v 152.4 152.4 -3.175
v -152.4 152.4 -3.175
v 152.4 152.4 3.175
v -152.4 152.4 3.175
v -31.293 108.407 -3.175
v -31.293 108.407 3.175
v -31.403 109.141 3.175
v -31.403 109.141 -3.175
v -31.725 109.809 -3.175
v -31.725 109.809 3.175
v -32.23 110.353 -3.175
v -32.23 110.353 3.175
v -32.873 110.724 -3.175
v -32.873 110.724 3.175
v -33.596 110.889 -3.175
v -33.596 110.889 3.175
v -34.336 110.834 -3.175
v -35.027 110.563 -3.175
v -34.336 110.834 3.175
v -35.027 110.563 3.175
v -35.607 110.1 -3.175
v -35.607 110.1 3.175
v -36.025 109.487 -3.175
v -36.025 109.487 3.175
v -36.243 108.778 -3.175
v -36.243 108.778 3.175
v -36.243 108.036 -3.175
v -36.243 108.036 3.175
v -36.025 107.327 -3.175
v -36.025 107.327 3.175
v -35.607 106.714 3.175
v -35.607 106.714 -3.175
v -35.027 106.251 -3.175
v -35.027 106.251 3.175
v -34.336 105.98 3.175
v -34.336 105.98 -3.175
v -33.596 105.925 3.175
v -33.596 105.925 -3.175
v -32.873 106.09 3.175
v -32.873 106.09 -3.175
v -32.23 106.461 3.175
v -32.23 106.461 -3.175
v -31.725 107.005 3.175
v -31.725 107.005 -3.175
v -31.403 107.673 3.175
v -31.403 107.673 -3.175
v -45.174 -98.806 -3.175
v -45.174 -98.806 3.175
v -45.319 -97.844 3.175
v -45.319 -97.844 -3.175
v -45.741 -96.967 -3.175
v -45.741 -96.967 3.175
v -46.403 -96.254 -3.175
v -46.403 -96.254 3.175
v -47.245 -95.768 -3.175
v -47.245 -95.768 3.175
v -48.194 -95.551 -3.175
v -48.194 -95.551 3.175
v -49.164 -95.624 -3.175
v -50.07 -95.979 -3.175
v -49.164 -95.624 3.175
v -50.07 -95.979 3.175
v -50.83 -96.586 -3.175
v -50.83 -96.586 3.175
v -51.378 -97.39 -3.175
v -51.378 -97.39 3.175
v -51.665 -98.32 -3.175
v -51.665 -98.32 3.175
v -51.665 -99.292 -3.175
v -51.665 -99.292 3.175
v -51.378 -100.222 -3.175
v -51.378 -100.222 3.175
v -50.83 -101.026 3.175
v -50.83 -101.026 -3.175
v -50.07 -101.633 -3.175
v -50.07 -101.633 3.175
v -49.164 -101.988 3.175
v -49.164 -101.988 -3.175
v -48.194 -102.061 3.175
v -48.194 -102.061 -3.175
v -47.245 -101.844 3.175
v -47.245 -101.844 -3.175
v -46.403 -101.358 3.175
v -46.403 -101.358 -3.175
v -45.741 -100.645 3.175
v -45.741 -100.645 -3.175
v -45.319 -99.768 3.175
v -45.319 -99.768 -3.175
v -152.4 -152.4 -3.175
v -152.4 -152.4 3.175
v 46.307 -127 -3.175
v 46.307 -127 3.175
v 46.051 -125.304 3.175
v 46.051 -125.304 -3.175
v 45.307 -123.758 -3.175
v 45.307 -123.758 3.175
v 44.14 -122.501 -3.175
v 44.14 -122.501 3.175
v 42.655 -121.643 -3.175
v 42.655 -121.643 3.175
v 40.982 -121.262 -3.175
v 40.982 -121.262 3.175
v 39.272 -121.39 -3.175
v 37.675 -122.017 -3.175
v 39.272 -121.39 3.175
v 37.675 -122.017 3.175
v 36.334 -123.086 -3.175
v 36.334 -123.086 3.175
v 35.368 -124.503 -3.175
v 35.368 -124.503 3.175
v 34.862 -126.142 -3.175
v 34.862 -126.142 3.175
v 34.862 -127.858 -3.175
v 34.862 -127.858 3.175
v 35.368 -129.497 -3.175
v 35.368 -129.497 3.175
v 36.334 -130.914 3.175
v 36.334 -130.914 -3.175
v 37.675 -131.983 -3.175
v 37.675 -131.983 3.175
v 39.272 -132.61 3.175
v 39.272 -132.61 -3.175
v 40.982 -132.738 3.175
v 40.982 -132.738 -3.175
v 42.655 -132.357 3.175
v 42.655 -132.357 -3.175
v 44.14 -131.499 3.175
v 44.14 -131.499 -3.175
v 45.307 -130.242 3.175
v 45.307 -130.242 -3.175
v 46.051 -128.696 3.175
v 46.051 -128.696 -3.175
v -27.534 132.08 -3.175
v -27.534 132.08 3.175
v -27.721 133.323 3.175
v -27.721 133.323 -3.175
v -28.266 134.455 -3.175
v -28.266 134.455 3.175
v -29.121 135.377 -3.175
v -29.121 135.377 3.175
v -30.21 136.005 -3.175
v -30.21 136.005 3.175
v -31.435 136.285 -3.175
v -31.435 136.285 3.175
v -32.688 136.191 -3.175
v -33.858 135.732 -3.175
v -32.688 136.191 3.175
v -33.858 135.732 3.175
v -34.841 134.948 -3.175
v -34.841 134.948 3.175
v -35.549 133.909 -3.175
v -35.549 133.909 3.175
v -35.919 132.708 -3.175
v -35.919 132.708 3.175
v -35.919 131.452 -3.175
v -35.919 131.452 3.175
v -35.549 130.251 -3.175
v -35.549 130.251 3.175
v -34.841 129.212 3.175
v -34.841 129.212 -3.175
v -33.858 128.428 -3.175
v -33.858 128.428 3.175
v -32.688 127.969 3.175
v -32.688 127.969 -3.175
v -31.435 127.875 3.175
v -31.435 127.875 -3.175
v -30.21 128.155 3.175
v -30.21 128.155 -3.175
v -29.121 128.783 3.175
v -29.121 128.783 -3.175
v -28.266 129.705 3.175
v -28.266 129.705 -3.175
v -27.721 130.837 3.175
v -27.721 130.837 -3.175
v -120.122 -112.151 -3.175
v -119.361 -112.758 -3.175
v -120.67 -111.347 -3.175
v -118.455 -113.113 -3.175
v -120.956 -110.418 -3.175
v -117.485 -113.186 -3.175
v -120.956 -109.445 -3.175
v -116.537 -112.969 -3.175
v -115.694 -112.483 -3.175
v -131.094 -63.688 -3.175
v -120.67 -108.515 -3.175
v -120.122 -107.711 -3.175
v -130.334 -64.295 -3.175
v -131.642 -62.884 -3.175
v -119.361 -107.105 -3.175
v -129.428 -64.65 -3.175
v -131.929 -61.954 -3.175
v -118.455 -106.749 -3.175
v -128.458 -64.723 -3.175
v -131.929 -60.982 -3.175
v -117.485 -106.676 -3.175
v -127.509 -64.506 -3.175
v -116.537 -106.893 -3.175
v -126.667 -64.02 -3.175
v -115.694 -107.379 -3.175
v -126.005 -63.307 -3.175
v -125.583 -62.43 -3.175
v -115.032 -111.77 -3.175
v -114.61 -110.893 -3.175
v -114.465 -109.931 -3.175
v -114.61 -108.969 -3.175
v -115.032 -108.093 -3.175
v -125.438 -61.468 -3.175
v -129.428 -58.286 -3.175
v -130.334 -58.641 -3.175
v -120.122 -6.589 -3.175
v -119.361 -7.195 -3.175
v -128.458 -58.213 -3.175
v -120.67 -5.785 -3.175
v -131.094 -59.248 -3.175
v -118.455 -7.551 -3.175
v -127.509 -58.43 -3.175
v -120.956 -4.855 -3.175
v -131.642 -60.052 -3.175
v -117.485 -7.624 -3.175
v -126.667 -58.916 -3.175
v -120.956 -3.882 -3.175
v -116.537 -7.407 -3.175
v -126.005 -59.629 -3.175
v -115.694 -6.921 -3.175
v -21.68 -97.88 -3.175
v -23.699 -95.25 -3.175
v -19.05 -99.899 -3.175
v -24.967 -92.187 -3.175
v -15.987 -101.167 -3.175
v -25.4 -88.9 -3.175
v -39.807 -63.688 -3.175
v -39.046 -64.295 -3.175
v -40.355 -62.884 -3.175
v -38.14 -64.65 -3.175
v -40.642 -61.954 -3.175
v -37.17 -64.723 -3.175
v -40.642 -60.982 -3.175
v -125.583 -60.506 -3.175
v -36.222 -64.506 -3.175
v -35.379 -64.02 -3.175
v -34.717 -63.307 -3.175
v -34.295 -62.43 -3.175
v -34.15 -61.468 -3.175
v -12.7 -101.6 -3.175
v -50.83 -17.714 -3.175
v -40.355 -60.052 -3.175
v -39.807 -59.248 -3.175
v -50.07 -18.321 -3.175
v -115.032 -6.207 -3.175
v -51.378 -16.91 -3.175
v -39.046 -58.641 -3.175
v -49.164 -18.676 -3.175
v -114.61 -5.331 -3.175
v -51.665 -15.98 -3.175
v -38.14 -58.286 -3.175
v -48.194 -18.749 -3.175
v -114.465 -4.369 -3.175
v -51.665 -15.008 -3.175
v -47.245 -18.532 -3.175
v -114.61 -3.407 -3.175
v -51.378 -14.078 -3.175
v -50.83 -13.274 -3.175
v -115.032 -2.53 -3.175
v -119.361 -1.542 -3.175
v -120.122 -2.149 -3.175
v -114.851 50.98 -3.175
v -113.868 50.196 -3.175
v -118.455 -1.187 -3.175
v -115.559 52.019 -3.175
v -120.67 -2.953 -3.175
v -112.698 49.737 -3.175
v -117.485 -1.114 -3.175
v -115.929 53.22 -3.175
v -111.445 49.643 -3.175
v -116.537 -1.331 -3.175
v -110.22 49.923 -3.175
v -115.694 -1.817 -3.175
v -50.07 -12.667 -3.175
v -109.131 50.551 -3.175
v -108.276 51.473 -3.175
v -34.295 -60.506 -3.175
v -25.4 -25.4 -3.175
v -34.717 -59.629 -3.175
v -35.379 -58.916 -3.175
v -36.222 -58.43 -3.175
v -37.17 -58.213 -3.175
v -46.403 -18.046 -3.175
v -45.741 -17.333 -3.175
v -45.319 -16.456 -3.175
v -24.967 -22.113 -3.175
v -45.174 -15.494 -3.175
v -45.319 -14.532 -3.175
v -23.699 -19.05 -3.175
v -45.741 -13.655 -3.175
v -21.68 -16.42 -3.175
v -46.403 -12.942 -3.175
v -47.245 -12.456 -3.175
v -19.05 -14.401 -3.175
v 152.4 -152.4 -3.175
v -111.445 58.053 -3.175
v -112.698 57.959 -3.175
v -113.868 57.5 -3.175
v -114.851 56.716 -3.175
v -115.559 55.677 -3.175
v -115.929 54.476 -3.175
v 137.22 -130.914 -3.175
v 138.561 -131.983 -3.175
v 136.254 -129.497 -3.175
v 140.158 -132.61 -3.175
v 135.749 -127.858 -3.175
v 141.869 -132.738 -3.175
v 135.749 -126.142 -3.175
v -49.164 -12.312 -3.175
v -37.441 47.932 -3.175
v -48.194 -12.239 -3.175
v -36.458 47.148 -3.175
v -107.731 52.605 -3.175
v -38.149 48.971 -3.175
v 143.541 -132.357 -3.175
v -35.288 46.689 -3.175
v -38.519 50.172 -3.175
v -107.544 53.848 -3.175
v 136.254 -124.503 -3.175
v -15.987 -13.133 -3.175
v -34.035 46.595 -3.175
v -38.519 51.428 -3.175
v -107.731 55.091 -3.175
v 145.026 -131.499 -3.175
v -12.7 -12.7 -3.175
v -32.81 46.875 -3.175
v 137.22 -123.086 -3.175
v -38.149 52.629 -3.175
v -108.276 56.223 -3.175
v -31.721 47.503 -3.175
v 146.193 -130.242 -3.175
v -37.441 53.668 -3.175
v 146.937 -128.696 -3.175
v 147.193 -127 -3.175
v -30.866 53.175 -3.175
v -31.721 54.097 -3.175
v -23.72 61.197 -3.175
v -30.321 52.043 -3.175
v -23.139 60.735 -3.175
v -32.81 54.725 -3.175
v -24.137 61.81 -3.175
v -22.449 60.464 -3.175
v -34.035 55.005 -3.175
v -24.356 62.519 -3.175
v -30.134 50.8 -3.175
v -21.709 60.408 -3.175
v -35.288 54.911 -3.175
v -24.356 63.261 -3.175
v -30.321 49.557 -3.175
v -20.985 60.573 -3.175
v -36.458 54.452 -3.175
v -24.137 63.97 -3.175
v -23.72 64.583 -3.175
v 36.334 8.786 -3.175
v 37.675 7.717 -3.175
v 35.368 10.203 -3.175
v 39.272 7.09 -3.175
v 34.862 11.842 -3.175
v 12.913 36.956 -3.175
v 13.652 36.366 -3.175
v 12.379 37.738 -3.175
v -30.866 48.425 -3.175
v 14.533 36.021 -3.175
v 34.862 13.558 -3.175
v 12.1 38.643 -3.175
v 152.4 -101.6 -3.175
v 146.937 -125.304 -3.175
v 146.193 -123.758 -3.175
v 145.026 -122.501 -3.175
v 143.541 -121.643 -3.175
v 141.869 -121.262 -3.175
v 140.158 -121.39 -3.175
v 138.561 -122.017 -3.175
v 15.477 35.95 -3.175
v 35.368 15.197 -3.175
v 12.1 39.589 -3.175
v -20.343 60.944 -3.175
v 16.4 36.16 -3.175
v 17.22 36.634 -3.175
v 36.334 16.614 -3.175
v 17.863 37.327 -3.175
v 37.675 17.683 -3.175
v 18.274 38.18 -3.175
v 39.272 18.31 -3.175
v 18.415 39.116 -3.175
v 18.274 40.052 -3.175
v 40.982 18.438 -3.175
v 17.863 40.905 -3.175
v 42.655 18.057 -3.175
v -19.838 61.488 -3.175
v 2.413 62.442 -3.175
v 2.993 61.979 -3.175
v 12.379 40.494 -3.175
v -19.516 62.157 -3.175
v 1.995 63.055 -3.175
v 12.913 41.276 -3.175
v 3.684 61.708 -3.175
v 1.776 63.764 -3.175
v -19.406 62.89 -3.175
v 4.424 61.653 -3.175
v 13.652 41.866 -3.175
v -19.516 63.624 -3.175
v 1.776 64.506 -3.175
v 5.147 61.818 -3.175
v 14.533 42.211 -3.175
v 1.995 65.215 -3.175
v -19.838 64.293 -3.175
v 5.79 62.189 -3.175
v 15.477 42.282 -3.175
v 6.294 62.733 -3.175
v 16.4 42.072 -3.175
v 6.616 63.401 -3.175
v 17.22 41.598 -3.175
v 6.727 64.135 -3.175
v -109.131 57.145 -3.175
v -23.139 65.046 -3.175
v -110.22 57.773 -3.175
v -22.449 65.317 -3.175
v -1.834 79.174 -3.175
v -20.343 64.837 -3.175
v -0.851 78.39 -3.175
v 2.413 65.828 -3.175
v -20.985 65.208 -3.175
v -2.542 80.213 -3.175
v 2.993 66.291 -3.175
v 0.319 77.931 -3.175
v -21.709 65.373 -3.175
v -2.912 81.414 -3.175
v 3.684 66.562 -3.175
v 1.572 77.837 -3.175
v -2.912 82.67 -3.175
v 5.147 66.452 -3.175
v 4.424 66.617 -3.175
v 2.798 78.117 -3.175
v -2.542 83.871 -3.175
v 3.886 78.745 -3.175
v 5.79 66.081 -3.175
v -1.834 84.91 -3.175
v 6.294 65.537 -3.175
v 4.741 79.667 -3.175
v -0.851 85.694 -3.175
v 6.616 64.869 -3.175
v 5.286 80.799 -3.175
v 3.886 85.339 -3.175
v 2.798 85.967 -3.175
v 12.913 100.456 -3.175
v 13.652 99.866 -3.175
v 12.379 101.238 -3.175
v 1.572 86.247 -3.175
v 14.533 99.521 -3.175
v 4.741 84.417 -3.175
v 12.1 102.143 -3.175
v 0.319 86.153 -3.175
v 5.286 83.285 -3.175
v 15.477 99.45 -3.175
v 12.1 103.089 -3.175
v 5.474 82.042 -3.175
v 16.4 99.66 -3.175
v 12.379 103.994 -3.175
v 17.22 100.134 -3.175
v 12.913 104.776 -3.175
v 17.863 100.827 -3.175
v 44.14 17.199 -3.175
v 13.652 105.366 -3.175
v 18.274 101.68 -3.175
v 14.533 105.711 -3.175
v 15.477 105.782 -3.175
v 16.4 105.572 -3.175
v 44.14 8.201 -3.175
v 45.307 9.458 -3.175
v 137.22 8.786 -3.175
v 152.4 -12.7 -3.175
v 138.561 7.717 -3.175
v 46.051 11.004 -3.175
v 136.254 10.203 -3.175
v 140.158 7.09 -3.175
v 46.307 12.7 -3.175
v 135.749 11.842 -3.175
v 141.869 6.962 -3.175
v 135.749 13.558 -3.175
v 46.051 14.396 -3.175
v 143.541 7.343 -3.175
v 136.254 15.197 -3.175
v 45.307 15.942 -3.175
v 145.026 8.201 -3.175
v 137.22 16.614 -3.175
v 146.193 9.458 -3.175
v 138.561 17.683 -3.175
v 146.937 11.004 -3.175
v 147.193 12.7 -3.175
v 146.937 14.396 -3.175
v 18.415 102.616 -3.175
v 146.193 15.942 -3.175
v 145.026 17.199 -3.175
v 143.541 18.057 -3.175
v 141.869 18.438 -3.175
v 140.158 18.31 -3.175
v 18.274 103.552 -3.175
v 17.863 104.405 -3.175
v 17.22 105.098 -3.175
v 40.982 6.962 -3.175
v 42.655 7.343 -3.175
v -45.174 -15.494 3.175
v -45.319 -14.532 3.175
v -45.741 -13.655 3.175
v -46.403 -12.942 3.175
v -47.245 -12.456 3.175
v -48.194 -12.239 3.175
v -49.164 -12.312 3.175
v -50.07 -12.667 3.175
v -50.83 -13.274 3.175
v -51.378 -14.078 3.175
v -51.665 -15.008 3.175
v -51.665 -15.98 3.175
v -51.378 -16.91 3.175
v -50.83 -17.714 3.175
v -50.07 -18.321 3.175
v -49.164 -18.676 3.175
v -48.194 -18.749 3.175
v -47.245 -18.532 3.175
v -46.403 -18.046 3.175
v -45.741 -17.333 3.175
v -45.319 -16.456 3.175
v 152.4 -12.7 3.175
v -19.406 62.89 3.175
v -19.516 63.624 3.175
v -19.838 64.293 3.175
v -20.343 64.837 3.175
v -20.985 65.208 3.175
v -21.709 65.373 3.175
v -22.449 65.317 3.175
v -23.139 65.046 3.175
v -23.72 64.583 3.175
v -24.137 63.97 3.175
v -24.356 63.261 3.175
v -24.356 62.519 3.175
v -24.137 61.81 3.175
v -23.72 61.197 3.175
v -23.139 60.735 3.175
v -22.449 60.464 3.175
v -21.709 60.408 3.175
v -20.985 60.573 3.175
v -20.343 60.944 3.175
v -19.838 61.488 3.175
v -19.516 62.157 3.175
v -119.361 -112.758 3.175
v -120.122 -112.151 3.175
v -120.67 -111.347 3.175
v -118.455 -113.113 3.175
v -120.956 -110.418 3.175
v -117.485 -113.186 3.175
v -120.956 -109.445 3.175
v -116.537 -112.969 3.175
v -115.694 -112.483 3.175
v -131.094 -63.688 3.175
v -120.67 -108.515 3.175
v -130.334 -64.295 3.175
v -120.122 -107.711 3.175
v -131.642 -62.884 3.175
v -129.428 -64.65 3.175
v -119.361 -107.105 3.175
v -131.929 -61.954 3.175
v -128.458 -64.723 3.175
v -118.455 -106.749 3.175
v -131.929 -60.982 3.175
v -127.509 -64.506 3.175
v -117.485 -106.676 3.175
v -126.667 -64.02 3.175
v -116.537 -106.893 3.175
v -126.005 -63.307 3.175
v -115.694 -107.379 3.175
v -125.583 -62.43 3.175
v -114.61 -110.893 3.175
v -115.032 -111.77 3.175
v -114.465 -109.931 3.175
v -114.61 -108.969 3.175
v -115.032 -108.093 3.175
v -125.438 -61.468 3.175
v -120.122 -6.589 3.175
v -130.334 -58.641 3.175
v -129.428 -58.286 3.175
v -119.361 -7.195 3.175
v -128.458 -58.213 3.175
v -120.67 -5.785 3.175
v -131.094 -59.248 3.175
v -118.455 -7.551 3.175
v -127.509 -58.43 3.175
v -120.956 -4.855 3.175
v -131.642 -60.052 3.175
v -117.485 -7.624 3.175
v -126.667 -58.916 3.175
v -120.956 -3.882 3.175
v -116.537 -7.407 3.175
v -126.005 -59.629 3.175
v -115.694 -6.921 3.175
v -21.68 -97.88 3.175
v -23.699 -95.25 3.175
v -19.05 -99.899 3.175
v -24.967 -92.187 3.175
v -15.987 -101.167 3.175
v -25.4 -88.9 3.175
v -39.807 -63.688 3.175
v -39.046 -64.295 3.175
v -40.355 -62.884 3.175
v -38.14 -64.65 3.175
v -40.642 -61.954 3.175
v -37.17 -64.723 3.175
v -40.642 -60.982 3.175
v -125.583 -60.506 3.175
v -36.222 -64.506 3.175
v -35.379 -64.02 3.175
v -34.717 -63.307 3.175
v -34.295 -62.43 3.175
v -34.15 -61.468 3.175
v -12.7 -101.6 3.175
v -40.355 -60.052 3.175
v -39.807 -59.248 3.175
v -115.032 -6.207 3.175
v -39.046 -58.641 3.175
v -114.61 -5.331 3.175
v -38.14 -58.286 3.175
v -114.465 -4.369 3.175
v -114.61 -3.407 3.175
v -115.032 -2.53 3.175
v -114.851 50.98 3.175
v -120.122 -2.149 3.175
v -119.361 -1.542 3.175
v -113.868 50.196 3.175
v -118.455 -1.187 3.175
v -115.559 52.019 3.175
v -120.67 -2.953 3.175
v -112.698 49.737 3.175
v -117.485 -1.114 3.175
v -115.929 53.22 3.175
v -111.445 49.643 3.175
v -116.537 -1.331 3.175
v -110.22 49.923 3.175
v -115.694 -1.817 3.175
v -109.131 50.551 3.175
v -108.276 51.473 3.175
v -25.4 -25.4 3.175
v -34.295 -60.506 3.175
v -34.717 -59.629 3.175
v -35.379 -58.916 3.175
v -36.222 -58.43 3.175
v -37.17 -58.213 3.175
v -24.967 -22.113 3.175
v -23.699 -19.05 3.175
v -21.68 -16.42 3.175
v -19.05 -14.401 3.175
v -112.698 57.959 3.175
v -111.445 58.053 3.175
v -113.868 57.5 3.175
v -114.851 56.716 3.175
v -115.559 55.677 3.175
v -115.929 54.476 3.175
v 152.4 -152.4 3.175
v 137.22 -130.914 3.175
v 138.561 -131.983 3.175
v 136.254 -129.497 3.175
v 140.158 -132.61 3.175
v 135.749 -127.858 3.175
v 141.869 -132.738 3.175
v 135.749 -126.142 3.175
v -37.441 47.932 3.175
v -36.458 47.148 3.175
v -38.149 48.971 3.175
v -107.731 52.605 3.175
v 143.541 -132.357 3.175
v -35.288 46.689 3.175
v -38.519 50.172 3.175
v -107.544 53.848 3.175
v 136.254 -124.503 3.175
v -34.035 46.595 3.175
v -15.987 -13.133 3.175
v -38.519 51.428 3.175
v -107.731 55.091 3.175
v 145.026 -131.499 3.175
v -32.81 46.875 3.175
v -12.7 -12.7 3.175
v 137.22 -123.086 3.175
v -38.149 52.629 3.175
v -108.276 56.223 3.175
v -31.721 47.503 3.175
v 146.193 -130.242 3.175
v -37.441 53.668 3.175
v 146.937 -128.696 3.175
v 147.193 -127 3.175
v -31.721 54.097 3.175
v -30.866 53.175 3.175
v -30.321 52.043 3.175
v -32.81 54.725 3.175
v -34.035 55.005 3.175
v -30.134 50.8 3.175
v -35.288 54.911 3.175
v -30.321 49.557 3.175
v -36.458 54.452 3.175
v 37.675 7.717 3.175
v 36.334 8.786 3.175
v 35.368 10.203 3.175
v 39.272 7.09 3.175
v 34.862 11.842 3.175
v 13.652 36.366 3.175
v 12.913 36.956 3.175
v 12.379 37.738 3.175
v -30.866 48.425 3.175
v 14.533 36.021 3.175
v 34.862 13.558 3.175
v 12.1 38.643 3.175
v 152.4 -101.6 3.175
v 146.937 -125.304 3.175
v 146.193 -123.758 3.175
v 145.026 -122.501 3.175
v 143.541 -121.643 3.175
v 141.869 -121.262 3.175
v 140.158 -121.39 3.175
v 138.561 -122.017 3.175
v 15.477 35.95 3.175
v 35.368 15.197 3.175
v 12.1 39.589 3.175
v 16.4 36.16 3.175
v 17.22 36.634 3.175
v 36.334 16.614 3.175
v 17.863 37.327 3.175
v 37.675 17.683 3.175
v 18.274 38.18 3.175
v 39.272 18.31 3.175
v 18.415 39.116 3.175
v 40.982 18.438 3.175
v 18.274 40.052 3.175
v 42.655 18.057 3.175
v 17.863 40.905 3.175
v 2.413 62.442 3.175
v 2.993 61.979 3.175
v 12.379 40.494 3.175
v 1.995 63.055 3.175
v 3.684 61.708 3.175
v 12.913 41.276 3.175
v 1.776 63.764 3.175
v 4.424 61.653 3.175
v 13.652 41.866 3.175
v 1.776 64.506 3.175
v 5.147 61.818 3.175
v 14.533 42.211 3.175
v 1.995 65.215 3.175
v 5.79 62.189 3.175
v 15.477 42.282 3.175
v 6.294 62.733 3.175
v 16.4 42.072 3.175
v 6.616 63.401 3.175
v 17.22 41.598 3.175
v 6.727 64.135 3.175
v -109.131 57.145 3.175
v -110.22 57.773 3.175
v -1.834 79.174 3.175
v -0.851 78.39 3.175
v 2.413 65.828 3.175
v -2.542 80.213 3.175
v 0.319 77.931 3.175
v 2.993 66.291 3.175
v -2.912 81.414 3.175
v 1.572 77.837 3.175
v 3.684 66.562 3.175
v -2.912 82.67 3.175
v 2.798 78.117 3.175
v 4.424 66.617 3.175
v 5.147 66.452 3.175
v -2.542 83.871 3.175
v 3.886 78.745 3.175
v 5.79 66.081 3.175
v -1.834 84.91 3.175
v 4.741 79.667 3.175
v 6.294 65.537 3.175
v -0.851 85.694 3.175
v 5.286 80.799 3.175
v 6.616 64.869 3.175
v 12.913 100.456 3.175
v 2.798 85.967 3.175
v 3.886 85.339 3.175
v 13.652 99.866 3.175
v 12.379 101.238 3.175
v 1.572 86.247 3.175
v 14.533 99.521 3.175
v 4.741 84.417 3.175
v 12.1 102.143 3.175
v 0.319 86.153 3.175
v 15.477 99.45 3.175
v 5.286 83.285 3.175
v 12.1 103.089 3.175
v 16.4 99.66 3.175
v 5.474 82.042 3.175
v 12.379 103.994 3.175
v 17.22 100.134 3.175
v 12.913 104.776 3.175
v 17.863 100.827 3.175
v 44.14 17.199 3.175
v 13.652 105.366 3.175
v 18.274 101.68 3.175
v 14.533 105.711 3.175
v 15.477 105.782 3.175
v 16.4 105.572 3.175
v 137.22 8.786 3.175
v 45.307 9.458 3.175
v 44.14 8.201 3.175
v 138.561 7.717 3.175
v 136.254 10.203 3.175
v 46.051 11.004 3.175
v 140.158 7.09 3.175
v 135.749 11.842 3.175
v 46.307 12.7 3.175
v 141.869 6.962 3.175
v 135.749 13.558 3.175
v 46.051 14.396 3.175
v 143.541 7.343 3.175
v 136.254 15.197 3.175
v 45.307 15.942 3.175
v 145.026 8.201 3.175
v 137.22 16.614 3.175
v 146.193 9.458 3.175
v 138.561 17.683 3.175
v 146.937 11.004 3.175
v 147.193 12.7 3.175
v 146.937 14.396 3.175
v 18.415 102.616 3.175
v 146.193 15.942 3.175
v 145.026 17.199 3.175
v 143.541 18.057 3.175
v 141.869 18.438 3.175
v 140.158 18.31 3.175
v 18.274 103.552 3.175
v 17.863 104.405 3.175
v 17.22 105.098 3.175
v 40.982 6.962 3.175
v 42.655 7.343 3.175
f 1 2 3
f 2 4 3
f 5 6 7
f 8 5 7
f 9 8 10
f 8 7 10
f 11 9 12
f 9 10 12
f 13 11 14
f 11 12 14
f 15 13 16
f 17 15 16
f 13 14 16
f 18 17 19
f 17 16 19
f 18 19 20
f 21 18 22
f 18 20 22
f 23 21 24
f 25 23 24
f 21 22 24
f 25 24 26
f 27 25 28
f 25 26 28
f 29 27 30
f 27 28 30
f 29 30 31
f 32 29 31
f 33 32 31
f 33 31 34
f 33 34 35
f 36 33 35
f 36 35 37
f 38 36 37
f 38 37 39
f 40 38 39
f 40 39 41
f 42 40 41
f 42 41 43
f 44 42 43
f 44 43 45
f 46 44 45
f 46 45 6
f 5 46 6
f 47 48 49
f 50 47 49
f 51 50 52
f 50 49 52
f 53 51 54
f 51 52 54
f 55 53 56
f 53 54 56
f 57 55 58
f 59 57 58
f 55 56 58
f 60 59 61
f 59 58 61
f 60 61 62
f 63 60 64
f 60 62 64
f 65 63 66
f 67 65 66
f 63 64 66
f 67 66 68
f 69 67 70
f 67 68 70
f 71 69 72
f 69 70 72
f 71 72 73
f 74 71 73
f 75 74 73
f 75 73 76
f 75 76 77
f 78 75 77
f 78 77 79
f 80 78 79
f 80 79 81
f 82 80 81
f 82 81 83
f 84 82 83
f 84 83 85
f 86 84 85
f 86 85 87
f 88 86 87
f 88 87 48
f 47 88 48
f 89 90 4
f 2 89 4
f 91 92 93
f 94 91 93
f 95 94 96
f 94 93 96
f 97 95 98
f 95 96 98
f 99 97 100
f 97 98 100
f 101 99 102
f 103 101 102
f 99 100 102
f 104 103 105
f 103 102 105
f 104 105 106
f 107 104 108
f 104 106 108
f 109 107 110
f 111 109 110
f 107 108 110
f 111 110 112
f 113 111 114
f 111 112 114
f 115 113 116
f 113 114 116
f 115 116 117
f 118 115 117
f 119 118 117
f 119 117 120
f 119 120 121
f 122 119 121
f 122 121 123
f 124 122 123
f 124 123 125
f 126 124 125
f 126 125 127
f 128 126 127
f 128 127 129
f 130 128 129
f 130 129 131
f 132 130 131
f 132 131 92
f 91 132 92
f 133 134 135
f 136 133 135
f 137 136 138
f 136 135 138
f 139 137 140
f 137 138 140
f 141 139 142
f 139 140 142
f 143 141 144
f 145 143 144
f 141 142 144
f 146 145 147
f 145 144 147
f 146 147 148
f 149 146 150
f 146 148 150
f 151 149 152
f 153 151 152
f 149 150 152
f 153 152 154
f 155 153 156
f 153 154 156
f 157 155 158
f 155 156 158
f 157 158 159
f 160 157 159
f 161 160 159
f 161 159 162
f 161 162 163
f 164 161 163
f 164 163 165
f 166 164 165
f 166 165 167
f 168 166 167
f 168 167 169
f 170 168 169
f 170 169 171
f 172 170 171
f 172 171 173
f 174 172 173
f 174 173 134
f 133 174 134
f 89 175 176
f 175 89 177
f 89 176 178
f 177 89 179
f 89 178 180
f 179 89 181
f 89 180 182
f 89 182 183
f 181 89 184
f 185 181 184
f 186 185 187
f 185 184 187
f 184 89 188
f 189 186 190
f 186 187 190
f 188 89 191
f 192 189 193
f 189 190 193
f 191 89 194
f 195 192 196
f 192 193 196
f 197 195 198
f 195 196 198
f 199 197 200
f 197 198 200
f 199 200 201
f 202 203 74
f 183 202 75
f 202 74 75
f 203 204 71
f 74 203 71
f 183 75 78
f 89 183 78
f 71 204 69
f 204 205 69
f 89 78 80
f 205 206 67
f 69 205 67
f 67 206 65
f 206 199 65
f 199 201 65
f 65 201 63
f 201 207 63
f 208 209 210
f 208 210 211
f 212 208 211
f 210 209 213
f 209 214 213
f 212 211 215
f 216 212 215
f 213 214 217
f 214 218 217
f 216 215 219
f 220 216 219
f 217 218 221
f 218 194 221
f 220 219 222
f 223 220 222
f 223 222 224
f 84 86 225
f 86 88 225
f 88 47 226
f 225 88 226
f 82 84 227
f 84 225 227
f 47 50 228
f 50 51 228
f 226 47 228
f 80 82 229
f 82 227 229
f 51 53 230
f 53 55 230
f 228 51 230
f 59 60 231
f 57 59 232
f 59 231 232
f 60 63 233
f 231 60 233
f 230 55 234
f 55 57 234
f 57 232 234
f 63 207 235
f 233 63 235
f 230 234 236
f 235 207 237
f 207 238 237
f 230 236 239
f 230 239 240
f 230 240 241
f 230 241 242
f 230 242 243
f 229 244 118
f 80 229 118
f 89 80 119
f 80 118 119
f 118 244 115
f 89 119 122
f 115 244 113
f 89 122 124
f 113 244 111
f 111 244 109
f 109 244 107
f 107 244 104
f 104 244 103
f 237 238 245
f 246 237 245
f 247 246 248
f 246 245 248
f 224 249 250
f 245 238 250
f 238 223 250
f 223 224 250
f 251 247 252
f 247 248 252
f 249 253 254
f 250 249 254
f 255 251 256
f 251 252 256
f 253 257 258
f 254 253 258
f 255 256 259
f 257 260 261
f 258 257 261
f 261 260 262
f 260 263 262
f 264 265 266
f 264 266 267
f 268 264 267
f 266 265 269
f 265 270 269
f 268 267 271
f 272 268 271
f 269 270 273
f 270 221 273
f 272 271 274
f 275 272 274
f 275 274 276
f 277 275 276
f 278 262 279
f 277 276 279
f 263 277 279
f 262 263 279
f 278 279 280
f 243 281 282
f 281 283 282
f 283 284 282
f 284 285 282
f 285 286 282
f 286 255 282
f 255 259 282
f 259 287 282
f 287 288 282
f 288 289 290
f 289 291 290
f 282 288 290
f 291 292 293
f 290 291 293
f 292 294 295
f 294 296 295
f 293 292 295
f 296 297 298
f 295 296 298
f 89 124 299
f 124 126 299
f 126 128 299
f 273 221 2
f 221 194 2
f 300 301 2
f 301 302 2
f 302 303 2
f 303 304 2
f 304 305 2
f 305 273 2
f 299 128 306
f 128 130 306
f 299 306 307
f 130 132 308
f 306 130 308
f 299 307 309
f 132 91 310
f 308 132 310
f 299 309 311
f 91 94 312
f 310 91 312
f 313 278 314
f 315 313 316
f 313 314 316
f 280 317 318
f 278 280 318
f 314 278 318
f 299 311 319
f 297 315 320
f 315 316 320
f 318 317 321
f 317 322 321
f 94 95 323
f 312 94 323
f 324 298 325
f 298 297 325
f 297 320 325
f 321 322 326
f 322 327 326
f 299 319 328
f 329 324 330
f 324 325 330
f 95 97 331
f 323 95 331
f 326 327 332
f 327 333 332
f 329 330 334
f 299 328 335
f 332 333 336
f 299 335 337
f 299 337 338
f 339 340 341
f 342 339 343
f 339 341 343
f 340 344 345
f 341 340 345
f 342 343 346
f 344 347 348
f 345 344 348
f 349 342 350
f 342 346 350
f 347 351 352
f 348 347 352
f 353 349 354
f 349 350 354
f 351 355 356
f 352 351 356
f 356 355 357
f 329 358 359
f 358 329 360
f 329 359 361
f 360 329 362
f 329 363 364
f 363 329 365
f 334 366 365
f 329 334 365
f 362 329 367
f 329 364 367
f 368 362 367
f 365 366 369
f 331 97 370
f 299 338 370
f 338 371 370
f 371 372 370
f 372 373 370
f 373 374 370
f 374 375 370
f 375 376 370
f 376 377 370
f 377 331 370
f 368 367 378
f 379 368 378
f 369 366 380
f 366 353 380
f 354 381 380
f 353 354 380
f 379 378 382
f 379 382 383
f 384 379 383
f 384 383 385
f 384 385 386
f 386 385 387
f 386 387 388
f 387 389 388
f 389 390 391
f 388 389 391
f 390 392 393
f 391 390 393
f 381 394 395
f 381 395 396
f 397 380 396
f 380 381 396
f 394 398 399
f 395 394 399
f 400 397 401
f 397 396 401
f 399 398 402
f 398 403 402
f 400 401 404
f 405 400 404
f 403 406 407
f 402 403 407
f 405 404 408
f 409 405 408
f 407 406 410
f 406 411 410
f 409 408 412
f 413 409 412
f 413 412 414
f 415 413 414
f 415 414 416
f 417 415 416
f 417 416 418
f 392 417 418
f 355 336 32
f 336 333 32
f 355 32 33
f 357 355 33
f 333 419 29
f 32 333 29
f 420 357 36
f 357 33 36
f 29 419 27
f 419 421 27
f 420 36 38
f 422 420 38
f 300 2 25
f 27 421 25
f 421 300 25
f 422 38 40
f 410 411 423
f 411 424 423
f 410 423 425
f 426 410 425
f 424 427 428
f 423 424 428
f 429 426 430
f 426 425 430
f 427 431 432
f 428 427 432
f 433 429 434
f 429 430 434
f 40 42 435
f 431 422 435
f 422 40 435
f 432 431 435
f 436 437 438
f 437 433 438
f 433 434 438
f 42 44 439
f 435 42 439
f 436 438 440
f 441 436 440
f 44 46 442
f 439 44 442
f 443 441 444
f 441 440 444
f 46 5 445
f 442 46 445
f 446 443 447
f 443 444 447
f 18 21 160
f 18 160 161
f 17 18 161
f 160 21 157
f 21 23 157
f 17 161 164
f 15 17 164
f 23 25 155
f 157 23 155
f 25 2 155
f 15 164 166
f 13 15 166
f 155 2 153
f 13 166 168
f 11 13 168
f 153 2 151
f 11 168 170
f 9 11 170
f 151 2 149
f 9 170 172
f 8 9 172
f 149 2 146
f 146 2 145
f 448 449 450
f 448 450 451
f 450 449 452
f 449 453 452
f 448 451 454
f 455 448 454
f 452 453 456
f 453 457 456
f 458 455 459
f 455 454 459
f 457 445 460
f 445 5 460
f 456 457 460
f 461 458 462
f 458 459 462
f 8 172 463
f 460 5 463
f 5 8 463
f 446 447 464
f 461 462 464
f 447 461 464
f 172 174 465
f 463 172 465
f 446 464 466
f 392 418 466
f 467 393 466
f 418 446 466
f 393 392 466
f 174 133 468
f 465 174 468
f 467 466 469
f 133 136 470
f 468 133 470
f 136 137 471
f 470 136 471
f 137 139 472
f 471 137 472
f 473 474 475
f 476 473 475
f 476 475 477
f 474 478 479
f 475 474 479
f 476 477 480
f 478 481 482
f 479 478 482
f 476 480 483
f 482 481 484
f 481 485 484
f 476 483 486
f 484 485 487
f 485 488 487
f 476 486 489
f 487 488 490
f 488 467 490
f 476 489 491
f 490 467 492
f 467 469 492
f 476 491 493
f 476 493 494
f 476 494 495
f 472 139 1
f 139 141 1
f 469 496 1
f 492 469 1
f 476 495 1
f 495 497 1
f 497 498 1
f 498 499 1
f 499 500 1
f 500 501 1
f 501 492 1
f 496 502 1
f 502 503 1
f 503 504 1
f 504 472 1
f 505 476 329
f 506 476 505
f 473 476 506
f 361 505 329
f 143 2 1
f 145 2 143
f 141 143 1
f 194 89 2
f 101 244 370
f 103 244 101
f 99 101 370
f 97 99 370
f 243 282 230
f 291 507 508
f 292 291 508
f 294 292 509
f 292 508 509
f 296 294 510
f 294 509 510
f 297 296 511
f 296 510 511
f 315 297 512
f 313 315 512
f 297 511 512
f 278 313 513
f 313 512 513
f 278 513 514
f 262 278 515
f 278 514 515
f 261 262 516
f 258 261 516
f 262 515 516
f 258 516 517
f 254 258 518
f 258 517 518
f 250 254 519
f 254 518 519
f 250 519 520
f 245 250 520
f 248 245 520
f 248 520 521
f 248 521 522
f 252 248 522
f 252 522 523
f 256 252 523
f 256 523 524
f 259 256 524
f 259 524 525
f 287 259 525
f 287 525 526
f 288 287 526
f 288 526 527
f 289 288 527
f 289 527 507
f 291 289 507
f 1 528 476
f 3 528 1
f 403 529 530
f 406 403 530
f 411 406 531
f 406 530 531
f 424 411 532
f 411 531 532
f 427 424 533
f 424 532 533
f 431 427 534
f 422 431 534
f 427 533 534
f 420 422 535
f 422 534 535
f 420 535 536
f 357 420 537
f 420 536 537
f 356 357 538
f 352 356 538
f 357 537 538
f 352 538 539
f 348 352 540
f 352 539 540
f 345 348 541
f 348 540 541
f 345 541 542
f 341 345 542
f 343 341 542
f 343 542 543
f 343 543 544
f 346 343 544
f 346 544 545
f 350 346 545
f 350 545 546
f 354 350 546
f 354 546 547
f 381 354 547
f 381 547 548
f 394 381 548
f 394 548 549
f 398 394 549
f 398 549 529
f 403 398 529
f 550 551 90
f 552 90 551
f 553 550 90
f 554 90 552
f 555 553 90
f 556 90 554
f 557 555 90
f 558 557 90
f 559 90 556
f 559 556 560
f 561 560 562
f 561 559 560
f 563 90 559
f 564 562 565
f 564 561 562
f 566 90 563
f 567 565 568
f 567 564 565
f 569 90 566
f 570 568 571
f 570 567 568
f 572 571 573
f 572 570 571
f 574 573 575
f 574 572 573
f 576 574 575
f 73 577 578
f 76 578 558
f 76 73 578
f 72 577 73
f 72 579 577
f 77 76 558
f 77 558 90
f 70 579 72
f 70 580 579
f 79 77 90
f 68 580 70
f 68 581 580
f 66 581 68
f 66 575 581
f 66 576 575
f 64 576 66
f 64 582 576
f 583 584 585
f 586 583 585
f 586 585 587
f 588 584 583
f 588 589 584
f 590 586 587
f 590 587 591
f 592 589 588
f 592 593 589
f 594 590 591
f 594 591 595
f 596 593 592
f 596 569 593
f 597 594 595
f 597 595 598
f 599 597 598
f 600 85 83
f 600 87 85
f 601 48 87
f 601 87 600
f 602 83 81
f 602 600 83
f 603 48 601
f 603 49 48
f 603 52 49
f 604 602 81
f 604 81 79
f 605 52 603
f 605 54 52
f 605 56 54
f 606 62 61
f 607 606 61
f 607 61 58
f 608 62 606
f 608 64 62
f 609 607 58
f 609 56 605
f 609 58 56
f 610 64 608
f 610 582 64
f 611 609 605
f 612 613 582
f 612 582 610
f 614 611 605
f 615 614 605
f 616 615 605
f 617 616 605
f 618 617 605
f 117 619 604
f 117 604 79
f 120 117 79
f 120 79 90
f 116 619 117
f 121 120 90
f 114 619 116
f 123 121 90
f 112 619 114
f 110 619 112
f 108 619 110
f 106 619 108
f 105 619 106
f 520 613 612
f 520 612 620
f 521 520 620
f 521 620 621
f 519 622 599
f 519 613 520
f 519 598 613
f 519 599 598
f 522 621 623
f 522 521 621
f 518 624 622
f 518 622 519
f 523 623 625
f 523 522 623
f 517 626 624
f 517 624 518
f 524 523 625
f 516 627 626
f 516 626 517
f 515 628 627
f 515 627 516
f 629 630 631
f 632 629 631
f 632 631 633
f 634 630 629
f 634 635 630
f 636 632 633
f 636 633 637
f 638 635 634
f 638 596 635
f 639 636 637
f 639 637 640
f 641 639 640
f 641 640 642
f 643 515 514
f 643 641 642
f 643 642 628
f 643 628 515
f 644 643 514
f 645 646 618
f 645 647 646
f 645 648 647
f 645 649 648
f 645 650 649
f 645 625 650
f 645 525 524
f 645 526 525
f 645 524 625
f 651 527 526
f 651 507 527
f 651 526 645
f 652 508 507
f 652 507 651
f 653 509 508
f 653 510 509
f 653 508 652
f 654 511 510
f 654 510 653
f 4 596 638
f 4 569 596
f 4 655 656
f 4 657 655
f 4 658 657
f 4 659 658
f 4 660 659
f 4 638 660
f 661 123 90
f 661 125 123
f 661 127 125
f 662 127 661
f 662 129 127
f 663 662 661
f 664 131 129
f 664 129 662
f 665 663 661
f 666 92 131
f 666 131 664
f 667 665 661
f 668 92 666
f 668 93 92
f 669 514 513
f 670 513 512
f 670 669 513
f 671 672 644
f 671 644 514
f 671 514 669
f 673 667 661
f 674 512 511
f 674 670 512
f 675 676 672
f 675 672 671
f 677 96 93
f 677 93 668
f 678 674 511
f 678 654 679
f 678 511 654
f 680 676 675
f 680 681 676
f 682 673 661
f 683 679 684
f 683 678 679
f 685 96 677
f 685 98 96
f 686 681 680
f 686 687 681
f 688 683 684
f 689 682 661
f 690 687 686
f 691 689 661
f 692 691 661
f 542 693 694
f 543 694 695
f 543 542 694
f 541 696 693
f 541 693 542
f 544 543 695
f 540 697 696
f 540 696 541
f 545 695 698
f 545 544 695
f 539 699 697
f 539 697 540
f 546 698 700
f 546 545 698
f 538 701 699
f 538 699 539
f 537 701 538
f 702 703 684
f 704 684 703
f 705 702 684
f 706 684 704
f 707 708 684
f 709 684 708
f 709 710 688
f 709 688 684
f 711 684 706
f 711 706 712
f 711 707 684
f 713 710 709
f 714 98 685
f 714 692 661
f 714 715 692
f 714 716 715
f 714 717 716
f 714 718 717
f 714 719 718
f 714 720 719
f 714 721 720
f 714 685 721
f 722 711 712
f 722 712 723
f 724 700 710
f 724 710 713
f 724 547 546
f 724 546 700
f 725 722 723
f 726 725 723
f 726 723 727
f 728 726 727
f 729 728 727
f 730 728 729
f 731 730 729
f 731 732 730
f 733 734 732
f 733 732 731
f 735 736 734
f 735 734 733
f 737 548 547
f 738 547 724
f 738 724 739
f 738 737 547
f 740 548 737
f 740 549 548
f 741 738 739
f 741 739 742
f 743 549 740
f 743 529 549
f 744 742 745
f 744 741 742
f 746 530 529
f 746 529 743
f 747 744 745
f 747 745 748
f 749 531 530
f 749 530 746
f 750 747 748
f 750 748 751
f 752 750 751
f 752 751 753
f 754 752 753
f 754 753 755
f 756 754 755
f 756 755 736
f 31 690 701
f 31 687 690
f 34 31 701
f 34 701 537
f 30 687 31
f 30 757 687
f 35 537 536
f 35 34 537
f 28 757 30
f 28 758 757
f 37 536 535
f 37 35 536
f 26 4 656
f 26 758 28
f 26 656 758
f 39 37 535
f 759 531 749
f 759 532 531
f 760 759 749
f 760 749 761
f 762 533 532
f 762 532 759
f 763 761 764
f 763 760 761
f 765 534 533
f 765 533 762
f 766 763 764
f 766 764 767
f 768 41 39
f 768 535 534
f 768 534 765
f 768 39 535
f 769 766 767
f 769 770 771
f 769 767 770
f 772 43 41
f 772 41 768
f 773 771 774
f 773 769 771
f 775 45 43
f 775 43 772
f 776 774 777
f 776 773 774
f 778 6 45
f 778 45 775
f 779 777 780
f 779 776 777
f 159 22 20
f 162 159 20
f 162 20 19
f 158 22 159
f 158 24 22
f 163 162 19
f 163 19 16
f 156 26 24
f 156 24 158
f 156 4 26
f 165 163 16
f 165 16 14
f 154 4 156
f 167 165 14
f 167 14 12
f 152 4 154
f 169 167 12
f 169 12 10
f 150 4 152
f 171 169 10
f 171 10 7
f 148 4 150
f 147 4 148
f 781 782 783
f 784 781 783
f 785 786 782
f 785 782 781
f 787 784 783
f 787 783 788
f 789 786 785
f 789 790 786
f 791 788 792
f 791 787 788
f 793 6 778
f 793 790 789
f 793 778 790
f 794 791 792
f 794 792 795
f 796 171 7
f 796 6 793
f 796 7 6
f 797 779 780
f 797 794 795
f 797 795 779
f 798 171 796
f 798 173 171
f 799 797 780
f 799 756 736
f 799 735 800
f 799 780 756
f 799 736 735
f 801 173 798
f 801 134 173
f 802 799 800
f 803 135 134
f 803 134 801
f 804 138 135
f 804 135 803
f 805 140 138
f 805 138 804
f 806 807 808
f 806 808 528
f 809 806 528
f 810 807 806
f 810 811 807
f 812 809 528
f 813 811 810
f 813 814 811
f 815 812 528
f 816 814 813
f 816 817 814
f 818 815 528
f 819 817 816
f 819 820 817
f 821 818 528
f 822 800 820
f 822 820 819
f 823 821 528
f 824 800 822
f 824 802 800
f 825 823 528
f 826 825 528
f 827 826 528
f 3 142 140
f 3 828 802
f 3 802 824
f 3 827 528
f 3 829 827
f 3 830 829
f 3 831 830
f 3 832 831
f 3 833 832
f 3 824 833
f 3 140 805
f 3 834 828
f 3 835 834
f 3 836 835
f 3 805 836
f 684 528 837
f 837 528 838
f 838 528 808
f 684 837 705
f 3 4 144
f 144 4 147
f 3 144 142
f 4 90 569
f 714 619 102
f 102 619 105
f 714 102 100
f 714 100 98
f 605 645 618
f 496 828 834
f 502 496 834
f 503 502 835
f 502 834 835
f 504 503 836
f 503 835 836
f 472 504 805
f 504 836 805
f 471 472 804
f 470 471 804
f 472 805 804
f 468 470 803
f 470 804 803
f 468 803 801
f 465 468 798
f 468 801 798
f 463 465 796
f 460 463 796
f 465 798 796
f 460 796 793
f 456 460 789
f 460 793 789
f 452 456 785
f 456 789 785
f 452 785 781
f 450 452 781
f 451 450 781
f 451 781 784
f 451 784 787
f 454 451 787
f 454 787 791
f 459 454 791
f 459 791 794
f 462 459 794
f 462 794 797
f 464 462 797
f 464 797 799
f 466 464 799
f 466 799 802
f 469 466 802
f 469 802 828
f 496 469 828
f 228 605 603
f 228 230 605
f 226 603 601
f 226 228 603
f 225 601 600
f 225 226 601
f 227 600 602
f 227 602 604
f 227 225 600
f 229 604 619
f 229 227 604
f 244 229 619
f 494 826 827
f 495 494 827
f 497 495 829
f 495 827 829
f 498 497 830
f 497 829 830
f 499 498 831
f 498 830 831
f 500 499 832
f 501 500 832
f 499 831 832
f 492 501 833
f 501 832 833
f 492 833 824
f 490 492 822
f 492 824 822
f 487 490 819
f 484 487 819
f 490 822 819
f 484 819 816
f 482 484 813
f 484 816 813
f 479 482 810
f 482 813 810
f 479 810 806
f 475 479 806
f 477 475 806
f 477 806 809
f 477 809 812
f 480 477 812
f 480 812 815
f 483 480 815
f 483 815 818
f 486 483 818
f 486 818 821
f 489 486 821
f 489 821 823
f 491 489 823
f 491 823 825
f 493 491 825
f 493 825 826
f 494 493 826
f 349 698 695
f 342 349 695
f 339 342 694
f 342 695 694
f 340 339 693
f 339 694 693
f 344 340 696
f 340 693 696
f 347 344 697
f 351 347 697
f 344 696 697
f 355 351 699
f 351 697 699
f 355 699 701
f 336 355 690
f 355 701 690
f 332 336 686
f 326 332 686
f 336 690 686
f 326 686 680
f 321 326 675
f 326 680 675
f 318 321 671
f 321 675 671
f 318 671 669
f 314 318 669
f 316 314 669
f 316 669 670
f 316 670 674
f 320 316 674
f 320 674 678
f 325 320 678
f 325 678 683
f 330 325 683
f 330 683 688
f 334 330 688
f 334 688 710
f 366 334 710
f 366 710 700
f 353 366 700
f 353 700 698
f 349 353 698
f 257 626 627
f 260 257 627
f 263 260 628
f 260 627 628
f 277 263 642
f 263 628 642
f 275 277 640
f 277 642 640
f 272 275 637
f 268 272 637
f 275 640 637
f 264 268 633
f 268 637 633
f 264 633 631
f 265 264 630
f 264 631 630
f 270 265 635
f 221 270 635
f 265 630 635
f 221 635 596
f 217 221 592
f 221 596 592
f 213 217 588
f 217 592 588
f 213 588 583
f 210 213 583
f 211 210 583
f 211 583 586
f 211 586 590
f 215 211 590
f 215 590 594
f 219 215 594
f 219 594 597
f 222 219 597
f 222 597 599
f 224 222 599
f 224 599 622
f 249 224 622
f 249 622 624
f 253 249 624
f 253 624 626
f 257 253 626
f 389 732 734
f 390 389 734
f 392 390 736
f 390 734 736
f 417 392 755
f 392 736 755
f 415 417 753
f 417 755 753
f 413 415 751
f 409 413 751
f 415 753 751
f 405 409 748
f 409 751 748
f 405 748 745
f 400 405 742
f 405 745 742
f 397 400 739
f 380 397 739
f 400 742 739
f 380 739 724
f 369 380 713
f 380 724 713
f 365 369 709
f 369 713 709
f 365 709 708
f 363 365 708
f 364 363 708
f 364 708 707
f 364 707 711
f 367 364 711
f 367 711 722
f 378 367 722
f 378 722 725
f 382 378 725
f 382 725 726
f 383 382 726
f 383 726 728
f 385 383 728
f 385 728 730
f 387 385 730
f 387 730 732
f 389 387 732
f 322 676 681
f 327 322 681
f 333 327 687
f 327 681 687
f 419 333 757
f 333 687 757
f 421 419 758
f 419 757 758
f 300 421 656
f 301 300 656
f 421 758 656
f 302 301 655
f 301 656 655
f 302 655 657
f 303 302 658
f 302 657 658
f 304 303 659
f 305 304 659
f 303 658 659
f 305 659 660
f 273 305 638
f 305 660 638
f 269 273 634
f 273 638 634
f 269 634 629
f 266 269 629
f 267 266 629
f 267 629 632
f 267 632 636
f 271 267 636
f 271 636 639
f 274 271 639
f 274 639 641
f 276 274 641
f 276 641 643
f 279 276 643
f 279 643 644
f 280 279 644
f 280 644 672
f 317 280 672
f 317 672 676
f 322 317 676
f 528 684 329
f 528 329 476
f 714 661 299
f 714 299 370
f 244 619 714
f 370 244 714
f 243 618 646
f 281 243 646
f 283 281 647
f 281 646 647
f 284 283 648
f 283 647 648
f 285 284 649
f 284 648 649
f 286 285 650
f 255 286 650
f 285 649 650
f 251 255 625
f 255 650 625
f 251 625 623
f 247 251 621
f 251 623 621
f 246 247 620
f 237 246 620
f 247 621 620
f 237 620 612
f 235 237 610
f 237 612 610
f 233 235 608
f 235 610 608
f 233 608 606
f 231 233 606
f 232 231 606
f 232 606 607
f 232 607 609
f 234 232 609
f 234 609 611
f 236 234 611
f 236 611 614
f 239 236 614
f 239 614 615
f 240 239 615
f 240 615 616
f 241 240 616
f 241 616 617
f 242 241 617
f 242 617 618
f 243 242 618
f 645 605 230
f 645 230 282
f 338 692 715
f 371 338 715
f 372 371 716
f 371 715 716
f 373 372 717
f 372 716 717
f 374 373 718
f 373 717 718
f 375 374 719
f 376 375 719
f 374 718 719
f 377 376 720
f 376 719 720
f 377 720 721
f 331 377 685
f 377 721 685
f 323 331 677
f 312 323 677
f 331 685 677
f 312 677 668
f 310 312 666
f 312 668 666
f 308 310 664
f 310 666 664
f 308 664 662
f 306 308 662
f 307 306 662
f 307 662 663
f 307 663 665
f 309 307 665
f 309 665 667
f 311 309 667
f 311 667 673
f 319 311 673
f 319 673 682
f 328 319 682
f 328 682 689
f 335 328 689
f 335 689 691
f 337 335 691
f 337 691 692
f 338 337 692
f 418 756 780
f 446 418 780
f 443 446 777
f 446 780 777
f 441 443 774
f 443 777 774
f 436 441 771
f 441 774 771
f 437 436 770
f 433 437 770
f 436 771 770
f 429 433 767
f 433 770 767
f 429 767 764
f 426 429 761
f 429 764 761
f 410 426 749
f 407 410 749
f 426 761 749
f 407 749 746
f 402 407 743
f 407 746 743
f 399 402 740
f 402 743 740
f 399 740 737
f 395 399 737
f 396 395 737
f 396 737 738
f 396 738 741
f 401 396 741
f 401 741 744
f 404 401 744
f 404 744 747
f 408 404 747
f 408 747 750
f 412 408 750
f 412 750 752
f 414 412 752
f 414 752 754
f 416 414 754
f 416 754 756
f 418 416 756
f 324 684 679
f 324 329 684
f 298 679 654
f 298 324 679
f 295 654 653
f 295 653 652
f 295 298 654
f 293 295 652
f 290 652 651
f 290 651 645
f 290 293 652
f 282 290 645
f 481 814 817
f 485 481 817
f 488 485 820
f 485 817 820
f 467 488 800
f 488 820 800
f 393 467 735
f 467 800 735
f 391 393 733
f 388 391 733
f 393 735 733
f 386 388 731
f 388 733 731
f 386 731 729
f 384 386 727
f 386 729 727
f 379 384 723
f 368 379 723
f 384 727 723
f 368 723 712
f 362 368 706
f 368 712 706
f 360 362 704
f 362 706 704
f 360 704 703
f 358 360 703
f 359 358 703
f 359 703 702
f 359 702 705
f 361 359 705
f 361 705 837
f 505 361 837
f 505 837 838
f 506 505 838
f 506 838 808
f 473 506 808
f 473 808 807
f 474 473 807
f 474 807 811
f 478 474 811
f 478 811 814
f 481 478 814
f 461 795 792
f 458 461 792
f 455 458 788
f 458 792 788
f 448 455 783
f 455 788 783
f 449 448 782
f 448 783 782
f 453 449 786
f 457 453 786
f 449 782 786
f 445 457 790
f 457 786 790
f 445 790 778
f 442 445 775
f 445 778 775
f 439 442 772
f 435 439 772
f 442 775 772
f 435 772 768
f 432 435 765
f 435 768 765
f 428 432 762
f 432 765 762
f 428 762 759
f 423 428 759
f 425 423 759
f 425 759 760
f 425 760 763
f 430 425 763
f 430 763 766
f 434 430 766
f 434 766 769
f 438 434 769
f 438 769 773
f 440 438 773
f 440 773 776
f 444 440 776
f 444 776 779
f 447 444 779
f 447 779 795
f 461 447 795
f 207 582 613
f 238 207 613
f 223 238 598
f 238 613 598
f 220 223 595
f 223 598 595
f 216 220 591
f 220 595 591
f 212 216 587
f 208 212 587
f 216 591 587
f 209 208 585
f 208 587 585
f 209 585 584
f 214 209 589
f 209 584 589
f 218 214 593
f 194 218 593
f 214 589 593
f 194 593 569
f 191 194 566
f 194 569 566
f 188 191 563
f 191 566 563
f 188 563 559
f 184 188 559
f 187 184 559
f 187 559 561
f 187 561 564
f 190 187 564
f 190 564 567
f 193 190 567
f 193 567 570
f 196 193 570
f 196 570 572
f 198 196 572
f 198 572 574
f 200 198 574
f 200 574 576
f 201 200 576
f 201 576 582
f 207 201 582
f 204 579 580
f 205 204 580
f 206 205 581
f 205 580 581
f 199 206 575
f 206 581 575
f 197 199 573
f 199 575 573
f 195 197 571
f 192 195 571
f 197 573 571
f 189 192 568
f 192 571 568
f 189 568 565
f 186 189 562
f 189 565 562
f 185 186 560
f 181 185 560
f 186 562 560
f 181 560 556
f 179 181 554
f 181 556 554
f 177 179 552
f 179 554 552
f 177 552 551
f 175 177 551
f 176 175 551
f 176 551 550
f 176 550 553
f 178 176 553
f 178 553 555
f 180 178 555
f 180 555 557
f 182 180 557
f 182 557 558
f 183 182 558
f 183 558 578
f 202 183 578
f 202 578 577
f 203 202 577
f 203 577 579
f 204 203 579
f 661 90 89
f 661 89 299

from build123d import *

# Parameters (mm, degrees)
F0_W      = 304.8
F0_H      = 304.8
F1_DEPTH  = 3.175
F2_W      = 177.8
F2_H      = 88.9
F3_DEPTH  = 6.351
F4_R      = 12.7
F5_R      = 5.75437
F6_DEPTH  = 6.351
F7_R      = 4.2164
F8_DEPTH  = 6.351
F9_R      = 4.2164
F10_DEPTH = 6.351
F11_R     = 3.175
F12_DEPTH = 6.351
F13_R     = 3.2639
F14_DEPTH = 6.351
F15_R     = 2.4892
F16_DEPTH = 25.4


with BuildPart() as f1:
    # F0 (on Top) → F1 (new body, symmetric)
    with BuildSketch(Plane.XY):
        Rectangle(F0_W, F0_H)
    extrude(amount=F1_DEPTH, both=True)

    # F2 (on face) → F3 (cut, through all)
    with BuildSketch(Plane.XY.offset(3.175)):
        with Locations((63.5, -57.15)):
            Rectangle(F2_W, F2_H)
    extrude(amount=-F3_DEPTH, mode=Mode.SUBTRACT)

    # F4
    f4_edges = [f1.edges().sort_by_distance(p)[0] for p in [
        (-25.4, -12.7, 0),
        (-25.4, -101.6, 0),
    ]]
    fillet(f4_edges, radius=F4_R)

    # F5 (on face) → F6 (cut, through all)
    with BuildSketch(Plane.XY.offset(3.175)):
        with Locations((40.55237, -127)):
            Circle(F5_R)
        with Locations((141.43863, -127)):
            Circle(F5_R)
        with Locations((40.55237, 12.7)):
            Circle(F5_R)
        with Locations((141.43863, 12.7)):
            Circle(F5_R)
    extrude(amount=-F6_DEPTH, mode=Mode.SUBTRACT)

    # F7 (on face) → F8 (cut, through all)
    with BuildSketch(Plane.XY.offset(3.175)):
        with Locations((-31.75, 132.08)):
            Circle(F7_R)
        with Locations((1.257298, 82.042)):
            Circle(F7_R)
    extrude(amount=-F8_DEPTH, mode=Mode.SUBTRACT)

    # F9 (on face) → F10 (cut, through all)
    with BuildSketch(Plane.XY.offset(3.175)):
        with Locations((-111.76, 53.848)):
            Circle(F9_R)
        with Locations((-34.349984, 50.8)):
            Circle(F9_R)
    extrude(amount=-F10_DEPTH, mode=Mode.SUBTRACT)

    # F11 (on face) → F12 (cut, through all)
    with BuildSketch(Plane.XY.offset(3.175)):
        with Locations((15.24, 102.616)):
            Circle(F11_R)
        with Locations((15.24, 39.116)):
            Circle(F11_R)
    extrude(amount=-F12_DEPTH, mode=Mode.SUBTRACT)

    # F13 (on face) → F14 (cut, through all)
    with BuildSketch(Plane.XY.offset(3.175)):
        with Locations((-48.4378, -98.806)):
            Circle(F13_R)
        with Locations((-128.7018, -61.468)):
            Circle(F13_R)
        with Locations((-117.729, -109.9312)):
            Circle(F13_R)
        with Locations((-37.4142, -61.468)):
            Circle(F13_R)
        with Locations((-48.4378, -15.494)):
            Circle(F13_R)
        with Locations((-117.729, -4.3688)):
            Circle(F13_R)
    extrude(amount=-F14_DEPTH, mode=Mode.SUBTRACT)

    # F15 (on face) → F16 (cut)
    with BuildSketch(Plane.XY.offset(3.175)):
        with Locations((-21.8948, 62.8904)):
            Circle(F15_R)
        with Locations((-33.782, 108.4072)):
            Circle(F15_R)
        with Locations((4.237579, 64.135)):
            Circle(F15_R)
    extrude(amount=-F16_DEPTH, mode=Mode.SUBTRACT)


solid = f1.part
